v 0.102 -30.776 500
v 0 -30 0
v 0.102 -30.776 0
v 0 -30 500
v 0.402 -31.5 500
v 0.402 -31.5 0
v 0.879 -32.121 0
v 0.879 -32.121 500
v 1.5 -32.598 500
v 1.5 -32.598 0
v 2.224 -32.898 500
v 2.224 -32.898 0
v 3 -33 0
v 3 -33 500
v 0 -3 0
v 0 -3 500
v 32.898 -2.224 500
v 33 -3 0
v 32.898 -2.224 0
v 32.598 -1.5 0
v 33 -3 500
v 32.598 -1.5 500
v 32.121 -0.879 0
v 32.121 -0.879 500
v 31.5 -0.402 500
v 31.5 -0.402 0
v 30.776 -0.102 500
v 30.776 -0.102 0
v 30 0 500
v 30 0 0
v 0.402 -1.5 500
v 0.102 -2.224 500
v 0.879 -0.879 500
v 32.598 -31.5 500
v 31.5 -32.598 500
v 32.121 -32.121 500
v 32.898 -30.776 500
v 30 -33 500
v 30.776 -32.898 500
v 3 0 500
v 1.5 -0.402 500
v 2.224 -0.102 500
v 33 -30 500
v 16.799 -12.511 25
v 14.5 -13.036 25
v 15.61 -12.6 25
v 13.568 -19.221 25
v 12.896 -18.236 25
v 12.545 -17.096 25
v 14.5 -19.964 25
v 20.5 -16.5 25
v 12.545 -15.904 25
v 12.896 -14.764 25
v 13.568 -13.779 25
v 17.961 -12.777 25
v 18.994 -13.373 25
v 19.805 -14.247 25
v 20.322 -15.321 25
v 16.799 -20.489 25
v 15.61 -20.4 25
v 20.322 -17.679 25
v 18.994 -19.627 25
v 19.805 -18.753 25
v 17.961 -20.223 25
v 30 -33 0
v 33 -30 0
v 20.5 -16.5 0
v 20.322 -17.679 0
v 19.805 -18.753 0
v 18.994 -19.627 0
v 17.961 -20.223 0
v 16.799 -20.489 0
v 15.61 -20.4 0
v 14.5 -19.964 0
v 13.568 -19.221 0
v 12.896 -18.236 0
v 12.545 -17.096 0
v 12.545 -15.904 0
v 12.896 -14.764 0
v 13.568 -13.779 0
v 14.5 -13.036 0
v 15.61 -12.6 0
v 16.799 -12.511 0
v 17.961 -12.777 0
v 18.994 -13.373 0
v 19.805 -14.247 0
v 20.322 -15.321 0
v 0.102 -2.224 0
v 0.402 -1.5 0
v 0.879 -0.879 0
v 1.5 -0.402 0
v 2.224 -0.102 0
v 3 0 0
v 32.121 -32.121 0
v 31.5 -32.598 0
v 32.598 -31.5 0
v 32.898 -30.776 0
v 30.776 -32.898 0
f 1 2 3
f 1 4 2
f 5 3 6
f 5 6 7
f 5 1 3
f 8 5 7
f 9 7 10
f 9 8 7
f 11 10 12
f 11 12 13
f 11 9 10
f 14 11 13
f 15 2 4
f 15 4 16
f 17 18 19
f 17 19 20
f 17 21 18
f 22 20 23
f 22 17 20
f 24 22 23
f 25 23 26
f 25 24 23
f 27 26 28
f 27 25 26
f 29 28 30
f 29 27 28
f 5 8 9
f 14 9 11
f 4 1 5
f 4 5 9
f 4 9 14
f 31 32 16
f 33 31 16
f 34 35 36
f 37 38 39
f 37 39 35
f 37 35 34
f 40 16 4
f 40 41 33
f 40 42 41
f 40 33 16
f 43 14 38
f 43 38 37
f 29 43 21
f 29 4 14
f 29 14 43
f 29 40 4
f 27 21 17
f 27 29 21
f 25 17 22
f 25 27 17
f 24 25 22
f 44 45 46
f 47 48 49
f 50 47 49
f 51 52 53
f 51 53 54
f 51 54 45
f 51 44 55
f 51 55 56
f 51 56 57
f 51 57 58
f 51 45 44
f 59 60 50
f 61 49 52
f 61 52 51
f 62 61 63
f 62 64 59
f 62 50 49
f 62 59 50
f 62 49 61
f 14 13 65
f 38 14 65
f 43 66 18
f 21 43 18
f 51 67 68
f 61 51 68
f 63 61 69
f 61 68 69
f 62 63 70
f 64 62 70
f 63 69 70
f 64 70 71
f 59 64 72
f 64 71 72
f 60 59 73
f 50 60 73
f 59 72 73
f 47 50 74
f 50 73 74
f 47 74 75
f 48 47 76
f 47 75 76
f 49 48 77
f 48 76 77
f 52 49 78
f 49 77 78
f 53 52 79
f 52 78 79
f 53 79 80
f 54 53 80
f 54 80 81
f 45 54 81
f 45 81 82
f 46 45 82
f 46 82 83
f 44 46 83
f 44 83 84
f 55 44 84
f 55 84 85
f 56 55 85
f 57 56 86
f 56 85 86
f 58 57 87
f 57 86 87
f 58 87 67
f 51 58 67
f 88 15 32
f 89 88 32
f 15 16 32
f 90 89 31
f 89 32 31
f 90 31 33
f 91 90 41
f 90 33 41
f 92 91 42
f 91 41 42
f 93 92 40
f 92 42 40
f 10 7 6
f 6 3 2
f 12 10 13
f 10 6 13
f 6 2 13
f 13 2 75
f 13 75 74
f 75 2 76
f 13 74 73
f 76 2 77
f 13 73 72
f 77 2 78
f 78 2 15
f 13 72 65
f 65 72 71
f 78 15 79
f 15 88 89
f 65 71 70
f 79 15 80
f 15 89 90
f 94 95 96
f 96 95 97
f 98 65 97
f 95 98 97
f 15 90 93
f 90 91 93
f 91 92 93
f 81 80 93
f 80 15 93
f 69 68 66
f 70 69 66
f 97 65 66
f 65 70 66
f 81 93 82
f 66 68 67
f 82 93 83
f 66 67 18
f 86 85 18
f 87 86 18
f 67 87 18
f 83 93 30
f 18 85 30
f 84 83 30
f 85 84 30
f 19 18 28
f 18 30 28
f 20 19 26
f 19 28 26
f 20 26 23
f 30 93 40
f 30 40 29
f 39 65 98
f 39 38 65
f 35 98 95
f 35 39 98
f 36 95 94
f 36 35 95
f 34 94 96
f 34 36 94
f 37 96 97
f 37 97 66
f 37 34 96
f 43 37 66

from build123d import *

# Parameters (mm, degrees)
F0_W     = 33
F0_H     = 33
F1_DEPTH = 500
F2_R     = 3
F3_R     = 4
F4_DEPTH = 25


with BuildPart() as f1:
    # F0 (on Top) → F1 (new body)
    with BuildSketch(Plane.XY):
        with Locations((16.5, -16.5)):
            Rectangle(F0_W, F0_H)
    extrude(amount=F1_DEPTH)

    # F2
    f2_edges = [f1.edges().sort_by_distance(p)[0] for p in [
        (33, 0, 250),
        (33, -33, 250),
        (0, -33, 250),
        (0, 0, 250),
    ]]
    fillet(f2_edges, radius=F2_R)

    # F3 (on face) → F4 (cut)
    with BuildSketch(Plane(origin=(0, 0, 0), x_dir=(1, 0, 0), z_dir=(0, 0, -1))):
        with Locations((16.5, 16.5)):
            Circle(F3_R)
    extrude(amount=-F4_DEPTH, mode=Mode.SUBTRACT)


solid = f1.part
